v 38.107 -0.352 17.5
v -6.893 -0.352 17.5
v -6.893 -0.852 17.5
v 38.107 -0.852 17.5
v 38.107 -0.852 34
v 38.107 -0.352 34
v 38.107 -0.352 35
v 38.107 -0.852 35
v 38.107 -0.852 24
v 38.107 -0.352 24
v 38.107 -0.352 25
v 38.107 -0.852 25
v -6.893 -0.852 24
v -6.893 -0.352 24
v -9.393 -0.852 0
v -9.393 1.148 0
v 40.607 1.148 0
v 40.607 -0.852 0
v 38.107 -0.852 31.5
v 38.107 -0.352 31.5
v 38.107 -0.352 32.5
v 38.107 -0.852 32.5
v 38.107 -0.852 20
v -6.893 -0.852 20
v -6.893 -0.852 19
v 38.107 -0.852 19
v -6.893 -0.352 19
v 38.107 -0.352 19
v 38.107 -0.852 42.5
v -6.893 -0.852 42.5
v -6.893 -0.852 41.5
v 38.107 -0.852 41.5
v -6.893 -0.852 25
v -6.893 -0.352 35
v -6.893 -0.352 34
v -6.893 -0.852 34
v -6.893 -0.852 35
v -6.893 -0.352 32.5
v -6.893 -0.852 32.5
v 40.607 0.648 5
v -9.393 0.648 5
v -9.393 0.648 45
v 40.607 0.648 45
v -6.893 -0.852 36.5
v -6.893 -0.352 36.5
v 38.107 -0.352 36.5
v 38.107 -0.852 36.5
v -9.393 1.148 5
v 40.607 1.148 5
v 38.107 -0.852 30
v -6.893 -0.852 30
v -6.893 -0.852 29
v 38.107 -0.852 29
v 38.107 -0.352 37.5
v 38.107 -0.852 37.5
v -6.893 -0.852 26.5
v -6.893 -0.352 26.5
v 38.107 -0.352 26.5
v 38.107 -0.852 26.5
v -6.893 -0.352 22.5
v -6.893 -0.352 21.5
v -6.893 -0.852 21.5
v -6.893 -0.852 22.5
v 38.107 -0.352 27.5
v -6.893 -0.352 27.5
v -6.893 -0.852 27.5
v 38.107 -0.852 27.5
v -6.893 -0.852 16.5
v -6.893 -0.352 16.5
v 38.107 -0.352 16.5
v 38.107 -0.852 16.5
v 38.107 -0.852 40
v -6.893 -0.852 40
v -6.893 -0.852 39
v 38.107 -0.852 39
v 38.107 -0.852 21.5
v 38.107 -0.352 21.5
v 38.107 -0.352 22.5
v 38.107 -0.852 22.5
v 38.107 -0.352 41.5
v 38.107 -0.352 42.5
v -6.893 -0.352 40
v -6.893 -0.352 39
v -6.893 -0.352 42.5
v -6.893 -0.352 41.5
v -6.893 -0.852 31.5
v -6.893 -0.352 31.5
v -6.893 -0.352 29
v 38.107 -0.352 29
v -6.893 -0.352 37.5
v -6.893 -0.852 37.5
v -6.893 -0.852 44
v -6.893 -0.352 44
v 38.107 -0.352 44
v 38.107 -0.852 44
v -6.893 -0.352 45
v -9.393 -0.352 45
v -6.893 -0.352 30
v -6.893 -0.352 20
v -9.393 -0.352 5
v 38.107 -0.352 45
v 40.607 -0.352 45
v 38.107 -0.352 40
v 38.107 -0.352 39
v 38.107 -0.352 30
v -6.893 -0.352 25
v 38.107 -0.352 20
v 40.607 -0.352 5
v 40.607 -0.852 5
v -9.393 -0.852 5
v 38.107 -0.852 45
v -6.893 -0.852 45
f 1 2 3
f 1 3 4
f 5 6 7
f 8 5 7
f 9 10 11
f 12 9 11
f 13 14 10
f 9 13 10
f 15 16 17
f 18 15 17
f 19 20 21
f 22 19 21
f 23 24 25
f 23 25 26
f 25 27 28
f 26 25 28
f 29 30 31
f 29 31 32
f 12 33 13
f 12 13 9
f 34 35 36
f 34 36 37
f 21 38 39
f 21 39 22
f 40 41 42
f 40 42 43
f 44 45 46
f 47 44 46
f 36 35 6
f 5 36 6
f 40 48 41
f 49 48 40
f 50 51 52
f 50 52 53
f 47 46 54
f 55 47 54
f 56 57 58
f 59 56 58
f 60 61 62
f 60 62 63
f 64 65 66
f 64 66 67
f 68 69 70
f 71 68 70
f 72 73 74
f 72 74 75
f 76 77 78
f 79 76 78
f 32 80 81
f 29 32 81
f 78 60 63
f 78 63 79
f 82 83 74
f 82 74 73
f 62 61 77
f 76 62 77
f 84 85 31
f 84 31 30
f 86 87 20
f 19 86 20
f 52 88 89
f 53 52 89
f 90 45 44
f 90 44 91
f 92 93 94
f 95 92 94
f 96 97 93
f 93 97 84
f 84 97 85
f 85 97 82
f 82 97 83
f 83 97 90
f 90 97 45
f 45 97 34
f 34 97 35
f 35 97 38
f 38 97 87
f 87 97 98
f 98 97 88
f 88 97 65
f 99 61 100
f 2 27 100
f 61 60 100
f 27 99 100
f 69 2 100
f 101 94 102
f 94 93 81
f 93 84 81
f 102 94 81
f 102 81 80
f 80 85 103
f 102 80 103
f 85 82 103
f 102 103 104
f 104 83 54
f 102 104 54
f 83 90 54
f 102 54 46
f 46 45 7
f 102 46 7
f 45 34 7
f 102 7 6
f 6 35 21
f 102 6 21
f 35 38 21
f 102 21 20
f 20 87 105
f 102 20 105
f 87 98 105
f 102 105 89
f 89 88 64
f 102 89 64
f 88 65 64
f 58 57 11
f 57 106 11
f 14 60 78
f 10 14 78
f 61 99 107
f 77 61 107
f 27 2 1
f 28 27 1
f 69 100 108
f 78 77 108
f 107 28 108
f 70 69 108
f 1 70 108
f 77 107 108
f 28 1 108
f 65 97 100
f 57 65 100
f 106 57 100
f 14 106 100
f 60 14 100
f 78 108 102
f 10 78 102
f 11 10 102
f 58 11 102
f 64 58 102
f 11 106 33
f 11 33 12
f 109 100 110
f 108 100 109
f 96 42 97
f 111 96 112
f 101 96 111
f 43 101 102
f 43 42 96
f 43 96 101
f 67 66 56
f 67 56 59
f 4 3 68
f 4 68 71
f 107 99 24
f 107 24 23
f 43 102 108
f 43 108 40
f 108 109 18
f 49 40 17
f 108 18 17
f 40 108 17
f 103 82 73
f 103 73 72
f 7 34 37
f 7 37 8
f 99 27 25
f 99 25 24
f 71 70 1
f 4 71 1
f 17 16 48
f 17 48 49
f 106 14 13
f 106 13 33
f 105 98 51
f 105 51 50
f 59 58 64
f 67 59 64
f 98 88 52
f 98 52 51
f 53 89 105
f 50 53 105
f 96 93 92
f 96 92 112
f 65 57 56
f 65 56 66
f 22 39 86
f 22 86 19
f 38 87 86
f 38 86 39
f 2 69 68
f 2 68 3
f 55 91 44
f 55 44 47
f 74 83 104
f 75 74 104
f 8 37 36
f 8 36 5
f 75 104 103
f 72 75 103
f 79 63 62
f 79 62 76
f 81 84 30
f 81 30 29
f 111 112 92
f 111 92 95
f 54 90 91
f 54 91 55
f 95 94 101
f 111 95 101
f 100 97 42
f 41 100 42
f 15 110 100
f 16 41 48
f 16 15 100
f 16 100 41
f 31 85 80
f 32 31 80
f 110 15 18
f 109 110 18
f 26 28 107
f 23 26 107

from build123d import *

# Parameters (mm, degrees)
SCHIZZO1_W                   = 50
SCHIZZO1_H                   = 2
ESTRUSIONE_ESTRUSIONE1_DEPTH = 5
SCHIZZO2_W                   = 50
SCHIZZO2_H                   = 1
ESTRUSIONE_ESTRUSIONE2_DEPTH = 40
SCHIZZO3_W                   = 45
SCHIZZO3_H                   = 1
ESTRUSIONE_ESTRUSIONE3_DEPTH = 0.5


with BuildPart() as part:
    # Schizzo1 → Estrusione-Estrusione1 (new body)
    with BuildSketch(Plane.XY):
        with Locations((15.607042649, 0.147727273)):
            Rectangle(SCHIZZO1_W, SCHIZZO1_H)
    extrude(amount=ESTRUSIONE_ESTRUSIONE1_DEPTH)

    # Schizzo2 → Estrusione-Estrusione2 (add)
    with BuildSketch(Plane.XY.offset(5)):
        with Locations((15.607042649, 0.147727273)):
            Rectangle(SCHIZZO2_W, SCHIZZO2_H)
    extrude(amount=ESTRUSIONE_ESTRUSIONE2_DEPTH)

    # Schizzo3 → Estrusione-Estrusione3 (add)
    with BuildSketch(Plane.XZ.offset(0.352272727)):
        with Locations((15.607042649, 44.5)):
            Rectangle(SCHIZZO3_W, SCHIZZO3_H)
        with Locations((15.607042649, 42)):
            Rectangle(SCHIZZO3_W, SCHIZZO3_H)
        with Locations((15.607042649, 39.5)):
            Rectangle(SCHIZZO3_W, SCHIZZO3_H)
        with Locations((15.607042649, 37)):
            Rectangle(SCHIZZO3_W, SCHIZZO3_H)
        with Locations((15.607042649, 34.5)):
            Rectangle(SCHIZZO3_W, SCHIZZO3_H)
        with Locations((15.607042649, 32)):
            Rectangle(SCHIZZO3_W, SCHIZZO3_H)
        with Locations((15.607042649, 29.5)):
            Rectangle(SCHIZZO3_W, SCHIZZO3_H)
        with Locations((15.607042649, 27)):
            Rectangle(SCHIZZO3_W, SCHIZZO3_H)
        with Locations((15.607042649, 24.5)):
            Rectangle(SCHIZZO3_W, SCHIZZO3_H)
        with Locations((15.607042649, 22)):
            Rectangle(SCHIZZO3_W, SCHIZZO3_H)
        with Locations((15.607042649, 19.5)):
            Rectangle(SCHIZZO3_W, SCHIZZO3_H)
        with Locations((15.607042649, 17)):
            Rectangle(SCHIZZO3_W, SCHIZZO3_H)
    extrude(amount=ESTRUSIONE_ESTRUSIONE3_DEPTH)


solid = part.part
